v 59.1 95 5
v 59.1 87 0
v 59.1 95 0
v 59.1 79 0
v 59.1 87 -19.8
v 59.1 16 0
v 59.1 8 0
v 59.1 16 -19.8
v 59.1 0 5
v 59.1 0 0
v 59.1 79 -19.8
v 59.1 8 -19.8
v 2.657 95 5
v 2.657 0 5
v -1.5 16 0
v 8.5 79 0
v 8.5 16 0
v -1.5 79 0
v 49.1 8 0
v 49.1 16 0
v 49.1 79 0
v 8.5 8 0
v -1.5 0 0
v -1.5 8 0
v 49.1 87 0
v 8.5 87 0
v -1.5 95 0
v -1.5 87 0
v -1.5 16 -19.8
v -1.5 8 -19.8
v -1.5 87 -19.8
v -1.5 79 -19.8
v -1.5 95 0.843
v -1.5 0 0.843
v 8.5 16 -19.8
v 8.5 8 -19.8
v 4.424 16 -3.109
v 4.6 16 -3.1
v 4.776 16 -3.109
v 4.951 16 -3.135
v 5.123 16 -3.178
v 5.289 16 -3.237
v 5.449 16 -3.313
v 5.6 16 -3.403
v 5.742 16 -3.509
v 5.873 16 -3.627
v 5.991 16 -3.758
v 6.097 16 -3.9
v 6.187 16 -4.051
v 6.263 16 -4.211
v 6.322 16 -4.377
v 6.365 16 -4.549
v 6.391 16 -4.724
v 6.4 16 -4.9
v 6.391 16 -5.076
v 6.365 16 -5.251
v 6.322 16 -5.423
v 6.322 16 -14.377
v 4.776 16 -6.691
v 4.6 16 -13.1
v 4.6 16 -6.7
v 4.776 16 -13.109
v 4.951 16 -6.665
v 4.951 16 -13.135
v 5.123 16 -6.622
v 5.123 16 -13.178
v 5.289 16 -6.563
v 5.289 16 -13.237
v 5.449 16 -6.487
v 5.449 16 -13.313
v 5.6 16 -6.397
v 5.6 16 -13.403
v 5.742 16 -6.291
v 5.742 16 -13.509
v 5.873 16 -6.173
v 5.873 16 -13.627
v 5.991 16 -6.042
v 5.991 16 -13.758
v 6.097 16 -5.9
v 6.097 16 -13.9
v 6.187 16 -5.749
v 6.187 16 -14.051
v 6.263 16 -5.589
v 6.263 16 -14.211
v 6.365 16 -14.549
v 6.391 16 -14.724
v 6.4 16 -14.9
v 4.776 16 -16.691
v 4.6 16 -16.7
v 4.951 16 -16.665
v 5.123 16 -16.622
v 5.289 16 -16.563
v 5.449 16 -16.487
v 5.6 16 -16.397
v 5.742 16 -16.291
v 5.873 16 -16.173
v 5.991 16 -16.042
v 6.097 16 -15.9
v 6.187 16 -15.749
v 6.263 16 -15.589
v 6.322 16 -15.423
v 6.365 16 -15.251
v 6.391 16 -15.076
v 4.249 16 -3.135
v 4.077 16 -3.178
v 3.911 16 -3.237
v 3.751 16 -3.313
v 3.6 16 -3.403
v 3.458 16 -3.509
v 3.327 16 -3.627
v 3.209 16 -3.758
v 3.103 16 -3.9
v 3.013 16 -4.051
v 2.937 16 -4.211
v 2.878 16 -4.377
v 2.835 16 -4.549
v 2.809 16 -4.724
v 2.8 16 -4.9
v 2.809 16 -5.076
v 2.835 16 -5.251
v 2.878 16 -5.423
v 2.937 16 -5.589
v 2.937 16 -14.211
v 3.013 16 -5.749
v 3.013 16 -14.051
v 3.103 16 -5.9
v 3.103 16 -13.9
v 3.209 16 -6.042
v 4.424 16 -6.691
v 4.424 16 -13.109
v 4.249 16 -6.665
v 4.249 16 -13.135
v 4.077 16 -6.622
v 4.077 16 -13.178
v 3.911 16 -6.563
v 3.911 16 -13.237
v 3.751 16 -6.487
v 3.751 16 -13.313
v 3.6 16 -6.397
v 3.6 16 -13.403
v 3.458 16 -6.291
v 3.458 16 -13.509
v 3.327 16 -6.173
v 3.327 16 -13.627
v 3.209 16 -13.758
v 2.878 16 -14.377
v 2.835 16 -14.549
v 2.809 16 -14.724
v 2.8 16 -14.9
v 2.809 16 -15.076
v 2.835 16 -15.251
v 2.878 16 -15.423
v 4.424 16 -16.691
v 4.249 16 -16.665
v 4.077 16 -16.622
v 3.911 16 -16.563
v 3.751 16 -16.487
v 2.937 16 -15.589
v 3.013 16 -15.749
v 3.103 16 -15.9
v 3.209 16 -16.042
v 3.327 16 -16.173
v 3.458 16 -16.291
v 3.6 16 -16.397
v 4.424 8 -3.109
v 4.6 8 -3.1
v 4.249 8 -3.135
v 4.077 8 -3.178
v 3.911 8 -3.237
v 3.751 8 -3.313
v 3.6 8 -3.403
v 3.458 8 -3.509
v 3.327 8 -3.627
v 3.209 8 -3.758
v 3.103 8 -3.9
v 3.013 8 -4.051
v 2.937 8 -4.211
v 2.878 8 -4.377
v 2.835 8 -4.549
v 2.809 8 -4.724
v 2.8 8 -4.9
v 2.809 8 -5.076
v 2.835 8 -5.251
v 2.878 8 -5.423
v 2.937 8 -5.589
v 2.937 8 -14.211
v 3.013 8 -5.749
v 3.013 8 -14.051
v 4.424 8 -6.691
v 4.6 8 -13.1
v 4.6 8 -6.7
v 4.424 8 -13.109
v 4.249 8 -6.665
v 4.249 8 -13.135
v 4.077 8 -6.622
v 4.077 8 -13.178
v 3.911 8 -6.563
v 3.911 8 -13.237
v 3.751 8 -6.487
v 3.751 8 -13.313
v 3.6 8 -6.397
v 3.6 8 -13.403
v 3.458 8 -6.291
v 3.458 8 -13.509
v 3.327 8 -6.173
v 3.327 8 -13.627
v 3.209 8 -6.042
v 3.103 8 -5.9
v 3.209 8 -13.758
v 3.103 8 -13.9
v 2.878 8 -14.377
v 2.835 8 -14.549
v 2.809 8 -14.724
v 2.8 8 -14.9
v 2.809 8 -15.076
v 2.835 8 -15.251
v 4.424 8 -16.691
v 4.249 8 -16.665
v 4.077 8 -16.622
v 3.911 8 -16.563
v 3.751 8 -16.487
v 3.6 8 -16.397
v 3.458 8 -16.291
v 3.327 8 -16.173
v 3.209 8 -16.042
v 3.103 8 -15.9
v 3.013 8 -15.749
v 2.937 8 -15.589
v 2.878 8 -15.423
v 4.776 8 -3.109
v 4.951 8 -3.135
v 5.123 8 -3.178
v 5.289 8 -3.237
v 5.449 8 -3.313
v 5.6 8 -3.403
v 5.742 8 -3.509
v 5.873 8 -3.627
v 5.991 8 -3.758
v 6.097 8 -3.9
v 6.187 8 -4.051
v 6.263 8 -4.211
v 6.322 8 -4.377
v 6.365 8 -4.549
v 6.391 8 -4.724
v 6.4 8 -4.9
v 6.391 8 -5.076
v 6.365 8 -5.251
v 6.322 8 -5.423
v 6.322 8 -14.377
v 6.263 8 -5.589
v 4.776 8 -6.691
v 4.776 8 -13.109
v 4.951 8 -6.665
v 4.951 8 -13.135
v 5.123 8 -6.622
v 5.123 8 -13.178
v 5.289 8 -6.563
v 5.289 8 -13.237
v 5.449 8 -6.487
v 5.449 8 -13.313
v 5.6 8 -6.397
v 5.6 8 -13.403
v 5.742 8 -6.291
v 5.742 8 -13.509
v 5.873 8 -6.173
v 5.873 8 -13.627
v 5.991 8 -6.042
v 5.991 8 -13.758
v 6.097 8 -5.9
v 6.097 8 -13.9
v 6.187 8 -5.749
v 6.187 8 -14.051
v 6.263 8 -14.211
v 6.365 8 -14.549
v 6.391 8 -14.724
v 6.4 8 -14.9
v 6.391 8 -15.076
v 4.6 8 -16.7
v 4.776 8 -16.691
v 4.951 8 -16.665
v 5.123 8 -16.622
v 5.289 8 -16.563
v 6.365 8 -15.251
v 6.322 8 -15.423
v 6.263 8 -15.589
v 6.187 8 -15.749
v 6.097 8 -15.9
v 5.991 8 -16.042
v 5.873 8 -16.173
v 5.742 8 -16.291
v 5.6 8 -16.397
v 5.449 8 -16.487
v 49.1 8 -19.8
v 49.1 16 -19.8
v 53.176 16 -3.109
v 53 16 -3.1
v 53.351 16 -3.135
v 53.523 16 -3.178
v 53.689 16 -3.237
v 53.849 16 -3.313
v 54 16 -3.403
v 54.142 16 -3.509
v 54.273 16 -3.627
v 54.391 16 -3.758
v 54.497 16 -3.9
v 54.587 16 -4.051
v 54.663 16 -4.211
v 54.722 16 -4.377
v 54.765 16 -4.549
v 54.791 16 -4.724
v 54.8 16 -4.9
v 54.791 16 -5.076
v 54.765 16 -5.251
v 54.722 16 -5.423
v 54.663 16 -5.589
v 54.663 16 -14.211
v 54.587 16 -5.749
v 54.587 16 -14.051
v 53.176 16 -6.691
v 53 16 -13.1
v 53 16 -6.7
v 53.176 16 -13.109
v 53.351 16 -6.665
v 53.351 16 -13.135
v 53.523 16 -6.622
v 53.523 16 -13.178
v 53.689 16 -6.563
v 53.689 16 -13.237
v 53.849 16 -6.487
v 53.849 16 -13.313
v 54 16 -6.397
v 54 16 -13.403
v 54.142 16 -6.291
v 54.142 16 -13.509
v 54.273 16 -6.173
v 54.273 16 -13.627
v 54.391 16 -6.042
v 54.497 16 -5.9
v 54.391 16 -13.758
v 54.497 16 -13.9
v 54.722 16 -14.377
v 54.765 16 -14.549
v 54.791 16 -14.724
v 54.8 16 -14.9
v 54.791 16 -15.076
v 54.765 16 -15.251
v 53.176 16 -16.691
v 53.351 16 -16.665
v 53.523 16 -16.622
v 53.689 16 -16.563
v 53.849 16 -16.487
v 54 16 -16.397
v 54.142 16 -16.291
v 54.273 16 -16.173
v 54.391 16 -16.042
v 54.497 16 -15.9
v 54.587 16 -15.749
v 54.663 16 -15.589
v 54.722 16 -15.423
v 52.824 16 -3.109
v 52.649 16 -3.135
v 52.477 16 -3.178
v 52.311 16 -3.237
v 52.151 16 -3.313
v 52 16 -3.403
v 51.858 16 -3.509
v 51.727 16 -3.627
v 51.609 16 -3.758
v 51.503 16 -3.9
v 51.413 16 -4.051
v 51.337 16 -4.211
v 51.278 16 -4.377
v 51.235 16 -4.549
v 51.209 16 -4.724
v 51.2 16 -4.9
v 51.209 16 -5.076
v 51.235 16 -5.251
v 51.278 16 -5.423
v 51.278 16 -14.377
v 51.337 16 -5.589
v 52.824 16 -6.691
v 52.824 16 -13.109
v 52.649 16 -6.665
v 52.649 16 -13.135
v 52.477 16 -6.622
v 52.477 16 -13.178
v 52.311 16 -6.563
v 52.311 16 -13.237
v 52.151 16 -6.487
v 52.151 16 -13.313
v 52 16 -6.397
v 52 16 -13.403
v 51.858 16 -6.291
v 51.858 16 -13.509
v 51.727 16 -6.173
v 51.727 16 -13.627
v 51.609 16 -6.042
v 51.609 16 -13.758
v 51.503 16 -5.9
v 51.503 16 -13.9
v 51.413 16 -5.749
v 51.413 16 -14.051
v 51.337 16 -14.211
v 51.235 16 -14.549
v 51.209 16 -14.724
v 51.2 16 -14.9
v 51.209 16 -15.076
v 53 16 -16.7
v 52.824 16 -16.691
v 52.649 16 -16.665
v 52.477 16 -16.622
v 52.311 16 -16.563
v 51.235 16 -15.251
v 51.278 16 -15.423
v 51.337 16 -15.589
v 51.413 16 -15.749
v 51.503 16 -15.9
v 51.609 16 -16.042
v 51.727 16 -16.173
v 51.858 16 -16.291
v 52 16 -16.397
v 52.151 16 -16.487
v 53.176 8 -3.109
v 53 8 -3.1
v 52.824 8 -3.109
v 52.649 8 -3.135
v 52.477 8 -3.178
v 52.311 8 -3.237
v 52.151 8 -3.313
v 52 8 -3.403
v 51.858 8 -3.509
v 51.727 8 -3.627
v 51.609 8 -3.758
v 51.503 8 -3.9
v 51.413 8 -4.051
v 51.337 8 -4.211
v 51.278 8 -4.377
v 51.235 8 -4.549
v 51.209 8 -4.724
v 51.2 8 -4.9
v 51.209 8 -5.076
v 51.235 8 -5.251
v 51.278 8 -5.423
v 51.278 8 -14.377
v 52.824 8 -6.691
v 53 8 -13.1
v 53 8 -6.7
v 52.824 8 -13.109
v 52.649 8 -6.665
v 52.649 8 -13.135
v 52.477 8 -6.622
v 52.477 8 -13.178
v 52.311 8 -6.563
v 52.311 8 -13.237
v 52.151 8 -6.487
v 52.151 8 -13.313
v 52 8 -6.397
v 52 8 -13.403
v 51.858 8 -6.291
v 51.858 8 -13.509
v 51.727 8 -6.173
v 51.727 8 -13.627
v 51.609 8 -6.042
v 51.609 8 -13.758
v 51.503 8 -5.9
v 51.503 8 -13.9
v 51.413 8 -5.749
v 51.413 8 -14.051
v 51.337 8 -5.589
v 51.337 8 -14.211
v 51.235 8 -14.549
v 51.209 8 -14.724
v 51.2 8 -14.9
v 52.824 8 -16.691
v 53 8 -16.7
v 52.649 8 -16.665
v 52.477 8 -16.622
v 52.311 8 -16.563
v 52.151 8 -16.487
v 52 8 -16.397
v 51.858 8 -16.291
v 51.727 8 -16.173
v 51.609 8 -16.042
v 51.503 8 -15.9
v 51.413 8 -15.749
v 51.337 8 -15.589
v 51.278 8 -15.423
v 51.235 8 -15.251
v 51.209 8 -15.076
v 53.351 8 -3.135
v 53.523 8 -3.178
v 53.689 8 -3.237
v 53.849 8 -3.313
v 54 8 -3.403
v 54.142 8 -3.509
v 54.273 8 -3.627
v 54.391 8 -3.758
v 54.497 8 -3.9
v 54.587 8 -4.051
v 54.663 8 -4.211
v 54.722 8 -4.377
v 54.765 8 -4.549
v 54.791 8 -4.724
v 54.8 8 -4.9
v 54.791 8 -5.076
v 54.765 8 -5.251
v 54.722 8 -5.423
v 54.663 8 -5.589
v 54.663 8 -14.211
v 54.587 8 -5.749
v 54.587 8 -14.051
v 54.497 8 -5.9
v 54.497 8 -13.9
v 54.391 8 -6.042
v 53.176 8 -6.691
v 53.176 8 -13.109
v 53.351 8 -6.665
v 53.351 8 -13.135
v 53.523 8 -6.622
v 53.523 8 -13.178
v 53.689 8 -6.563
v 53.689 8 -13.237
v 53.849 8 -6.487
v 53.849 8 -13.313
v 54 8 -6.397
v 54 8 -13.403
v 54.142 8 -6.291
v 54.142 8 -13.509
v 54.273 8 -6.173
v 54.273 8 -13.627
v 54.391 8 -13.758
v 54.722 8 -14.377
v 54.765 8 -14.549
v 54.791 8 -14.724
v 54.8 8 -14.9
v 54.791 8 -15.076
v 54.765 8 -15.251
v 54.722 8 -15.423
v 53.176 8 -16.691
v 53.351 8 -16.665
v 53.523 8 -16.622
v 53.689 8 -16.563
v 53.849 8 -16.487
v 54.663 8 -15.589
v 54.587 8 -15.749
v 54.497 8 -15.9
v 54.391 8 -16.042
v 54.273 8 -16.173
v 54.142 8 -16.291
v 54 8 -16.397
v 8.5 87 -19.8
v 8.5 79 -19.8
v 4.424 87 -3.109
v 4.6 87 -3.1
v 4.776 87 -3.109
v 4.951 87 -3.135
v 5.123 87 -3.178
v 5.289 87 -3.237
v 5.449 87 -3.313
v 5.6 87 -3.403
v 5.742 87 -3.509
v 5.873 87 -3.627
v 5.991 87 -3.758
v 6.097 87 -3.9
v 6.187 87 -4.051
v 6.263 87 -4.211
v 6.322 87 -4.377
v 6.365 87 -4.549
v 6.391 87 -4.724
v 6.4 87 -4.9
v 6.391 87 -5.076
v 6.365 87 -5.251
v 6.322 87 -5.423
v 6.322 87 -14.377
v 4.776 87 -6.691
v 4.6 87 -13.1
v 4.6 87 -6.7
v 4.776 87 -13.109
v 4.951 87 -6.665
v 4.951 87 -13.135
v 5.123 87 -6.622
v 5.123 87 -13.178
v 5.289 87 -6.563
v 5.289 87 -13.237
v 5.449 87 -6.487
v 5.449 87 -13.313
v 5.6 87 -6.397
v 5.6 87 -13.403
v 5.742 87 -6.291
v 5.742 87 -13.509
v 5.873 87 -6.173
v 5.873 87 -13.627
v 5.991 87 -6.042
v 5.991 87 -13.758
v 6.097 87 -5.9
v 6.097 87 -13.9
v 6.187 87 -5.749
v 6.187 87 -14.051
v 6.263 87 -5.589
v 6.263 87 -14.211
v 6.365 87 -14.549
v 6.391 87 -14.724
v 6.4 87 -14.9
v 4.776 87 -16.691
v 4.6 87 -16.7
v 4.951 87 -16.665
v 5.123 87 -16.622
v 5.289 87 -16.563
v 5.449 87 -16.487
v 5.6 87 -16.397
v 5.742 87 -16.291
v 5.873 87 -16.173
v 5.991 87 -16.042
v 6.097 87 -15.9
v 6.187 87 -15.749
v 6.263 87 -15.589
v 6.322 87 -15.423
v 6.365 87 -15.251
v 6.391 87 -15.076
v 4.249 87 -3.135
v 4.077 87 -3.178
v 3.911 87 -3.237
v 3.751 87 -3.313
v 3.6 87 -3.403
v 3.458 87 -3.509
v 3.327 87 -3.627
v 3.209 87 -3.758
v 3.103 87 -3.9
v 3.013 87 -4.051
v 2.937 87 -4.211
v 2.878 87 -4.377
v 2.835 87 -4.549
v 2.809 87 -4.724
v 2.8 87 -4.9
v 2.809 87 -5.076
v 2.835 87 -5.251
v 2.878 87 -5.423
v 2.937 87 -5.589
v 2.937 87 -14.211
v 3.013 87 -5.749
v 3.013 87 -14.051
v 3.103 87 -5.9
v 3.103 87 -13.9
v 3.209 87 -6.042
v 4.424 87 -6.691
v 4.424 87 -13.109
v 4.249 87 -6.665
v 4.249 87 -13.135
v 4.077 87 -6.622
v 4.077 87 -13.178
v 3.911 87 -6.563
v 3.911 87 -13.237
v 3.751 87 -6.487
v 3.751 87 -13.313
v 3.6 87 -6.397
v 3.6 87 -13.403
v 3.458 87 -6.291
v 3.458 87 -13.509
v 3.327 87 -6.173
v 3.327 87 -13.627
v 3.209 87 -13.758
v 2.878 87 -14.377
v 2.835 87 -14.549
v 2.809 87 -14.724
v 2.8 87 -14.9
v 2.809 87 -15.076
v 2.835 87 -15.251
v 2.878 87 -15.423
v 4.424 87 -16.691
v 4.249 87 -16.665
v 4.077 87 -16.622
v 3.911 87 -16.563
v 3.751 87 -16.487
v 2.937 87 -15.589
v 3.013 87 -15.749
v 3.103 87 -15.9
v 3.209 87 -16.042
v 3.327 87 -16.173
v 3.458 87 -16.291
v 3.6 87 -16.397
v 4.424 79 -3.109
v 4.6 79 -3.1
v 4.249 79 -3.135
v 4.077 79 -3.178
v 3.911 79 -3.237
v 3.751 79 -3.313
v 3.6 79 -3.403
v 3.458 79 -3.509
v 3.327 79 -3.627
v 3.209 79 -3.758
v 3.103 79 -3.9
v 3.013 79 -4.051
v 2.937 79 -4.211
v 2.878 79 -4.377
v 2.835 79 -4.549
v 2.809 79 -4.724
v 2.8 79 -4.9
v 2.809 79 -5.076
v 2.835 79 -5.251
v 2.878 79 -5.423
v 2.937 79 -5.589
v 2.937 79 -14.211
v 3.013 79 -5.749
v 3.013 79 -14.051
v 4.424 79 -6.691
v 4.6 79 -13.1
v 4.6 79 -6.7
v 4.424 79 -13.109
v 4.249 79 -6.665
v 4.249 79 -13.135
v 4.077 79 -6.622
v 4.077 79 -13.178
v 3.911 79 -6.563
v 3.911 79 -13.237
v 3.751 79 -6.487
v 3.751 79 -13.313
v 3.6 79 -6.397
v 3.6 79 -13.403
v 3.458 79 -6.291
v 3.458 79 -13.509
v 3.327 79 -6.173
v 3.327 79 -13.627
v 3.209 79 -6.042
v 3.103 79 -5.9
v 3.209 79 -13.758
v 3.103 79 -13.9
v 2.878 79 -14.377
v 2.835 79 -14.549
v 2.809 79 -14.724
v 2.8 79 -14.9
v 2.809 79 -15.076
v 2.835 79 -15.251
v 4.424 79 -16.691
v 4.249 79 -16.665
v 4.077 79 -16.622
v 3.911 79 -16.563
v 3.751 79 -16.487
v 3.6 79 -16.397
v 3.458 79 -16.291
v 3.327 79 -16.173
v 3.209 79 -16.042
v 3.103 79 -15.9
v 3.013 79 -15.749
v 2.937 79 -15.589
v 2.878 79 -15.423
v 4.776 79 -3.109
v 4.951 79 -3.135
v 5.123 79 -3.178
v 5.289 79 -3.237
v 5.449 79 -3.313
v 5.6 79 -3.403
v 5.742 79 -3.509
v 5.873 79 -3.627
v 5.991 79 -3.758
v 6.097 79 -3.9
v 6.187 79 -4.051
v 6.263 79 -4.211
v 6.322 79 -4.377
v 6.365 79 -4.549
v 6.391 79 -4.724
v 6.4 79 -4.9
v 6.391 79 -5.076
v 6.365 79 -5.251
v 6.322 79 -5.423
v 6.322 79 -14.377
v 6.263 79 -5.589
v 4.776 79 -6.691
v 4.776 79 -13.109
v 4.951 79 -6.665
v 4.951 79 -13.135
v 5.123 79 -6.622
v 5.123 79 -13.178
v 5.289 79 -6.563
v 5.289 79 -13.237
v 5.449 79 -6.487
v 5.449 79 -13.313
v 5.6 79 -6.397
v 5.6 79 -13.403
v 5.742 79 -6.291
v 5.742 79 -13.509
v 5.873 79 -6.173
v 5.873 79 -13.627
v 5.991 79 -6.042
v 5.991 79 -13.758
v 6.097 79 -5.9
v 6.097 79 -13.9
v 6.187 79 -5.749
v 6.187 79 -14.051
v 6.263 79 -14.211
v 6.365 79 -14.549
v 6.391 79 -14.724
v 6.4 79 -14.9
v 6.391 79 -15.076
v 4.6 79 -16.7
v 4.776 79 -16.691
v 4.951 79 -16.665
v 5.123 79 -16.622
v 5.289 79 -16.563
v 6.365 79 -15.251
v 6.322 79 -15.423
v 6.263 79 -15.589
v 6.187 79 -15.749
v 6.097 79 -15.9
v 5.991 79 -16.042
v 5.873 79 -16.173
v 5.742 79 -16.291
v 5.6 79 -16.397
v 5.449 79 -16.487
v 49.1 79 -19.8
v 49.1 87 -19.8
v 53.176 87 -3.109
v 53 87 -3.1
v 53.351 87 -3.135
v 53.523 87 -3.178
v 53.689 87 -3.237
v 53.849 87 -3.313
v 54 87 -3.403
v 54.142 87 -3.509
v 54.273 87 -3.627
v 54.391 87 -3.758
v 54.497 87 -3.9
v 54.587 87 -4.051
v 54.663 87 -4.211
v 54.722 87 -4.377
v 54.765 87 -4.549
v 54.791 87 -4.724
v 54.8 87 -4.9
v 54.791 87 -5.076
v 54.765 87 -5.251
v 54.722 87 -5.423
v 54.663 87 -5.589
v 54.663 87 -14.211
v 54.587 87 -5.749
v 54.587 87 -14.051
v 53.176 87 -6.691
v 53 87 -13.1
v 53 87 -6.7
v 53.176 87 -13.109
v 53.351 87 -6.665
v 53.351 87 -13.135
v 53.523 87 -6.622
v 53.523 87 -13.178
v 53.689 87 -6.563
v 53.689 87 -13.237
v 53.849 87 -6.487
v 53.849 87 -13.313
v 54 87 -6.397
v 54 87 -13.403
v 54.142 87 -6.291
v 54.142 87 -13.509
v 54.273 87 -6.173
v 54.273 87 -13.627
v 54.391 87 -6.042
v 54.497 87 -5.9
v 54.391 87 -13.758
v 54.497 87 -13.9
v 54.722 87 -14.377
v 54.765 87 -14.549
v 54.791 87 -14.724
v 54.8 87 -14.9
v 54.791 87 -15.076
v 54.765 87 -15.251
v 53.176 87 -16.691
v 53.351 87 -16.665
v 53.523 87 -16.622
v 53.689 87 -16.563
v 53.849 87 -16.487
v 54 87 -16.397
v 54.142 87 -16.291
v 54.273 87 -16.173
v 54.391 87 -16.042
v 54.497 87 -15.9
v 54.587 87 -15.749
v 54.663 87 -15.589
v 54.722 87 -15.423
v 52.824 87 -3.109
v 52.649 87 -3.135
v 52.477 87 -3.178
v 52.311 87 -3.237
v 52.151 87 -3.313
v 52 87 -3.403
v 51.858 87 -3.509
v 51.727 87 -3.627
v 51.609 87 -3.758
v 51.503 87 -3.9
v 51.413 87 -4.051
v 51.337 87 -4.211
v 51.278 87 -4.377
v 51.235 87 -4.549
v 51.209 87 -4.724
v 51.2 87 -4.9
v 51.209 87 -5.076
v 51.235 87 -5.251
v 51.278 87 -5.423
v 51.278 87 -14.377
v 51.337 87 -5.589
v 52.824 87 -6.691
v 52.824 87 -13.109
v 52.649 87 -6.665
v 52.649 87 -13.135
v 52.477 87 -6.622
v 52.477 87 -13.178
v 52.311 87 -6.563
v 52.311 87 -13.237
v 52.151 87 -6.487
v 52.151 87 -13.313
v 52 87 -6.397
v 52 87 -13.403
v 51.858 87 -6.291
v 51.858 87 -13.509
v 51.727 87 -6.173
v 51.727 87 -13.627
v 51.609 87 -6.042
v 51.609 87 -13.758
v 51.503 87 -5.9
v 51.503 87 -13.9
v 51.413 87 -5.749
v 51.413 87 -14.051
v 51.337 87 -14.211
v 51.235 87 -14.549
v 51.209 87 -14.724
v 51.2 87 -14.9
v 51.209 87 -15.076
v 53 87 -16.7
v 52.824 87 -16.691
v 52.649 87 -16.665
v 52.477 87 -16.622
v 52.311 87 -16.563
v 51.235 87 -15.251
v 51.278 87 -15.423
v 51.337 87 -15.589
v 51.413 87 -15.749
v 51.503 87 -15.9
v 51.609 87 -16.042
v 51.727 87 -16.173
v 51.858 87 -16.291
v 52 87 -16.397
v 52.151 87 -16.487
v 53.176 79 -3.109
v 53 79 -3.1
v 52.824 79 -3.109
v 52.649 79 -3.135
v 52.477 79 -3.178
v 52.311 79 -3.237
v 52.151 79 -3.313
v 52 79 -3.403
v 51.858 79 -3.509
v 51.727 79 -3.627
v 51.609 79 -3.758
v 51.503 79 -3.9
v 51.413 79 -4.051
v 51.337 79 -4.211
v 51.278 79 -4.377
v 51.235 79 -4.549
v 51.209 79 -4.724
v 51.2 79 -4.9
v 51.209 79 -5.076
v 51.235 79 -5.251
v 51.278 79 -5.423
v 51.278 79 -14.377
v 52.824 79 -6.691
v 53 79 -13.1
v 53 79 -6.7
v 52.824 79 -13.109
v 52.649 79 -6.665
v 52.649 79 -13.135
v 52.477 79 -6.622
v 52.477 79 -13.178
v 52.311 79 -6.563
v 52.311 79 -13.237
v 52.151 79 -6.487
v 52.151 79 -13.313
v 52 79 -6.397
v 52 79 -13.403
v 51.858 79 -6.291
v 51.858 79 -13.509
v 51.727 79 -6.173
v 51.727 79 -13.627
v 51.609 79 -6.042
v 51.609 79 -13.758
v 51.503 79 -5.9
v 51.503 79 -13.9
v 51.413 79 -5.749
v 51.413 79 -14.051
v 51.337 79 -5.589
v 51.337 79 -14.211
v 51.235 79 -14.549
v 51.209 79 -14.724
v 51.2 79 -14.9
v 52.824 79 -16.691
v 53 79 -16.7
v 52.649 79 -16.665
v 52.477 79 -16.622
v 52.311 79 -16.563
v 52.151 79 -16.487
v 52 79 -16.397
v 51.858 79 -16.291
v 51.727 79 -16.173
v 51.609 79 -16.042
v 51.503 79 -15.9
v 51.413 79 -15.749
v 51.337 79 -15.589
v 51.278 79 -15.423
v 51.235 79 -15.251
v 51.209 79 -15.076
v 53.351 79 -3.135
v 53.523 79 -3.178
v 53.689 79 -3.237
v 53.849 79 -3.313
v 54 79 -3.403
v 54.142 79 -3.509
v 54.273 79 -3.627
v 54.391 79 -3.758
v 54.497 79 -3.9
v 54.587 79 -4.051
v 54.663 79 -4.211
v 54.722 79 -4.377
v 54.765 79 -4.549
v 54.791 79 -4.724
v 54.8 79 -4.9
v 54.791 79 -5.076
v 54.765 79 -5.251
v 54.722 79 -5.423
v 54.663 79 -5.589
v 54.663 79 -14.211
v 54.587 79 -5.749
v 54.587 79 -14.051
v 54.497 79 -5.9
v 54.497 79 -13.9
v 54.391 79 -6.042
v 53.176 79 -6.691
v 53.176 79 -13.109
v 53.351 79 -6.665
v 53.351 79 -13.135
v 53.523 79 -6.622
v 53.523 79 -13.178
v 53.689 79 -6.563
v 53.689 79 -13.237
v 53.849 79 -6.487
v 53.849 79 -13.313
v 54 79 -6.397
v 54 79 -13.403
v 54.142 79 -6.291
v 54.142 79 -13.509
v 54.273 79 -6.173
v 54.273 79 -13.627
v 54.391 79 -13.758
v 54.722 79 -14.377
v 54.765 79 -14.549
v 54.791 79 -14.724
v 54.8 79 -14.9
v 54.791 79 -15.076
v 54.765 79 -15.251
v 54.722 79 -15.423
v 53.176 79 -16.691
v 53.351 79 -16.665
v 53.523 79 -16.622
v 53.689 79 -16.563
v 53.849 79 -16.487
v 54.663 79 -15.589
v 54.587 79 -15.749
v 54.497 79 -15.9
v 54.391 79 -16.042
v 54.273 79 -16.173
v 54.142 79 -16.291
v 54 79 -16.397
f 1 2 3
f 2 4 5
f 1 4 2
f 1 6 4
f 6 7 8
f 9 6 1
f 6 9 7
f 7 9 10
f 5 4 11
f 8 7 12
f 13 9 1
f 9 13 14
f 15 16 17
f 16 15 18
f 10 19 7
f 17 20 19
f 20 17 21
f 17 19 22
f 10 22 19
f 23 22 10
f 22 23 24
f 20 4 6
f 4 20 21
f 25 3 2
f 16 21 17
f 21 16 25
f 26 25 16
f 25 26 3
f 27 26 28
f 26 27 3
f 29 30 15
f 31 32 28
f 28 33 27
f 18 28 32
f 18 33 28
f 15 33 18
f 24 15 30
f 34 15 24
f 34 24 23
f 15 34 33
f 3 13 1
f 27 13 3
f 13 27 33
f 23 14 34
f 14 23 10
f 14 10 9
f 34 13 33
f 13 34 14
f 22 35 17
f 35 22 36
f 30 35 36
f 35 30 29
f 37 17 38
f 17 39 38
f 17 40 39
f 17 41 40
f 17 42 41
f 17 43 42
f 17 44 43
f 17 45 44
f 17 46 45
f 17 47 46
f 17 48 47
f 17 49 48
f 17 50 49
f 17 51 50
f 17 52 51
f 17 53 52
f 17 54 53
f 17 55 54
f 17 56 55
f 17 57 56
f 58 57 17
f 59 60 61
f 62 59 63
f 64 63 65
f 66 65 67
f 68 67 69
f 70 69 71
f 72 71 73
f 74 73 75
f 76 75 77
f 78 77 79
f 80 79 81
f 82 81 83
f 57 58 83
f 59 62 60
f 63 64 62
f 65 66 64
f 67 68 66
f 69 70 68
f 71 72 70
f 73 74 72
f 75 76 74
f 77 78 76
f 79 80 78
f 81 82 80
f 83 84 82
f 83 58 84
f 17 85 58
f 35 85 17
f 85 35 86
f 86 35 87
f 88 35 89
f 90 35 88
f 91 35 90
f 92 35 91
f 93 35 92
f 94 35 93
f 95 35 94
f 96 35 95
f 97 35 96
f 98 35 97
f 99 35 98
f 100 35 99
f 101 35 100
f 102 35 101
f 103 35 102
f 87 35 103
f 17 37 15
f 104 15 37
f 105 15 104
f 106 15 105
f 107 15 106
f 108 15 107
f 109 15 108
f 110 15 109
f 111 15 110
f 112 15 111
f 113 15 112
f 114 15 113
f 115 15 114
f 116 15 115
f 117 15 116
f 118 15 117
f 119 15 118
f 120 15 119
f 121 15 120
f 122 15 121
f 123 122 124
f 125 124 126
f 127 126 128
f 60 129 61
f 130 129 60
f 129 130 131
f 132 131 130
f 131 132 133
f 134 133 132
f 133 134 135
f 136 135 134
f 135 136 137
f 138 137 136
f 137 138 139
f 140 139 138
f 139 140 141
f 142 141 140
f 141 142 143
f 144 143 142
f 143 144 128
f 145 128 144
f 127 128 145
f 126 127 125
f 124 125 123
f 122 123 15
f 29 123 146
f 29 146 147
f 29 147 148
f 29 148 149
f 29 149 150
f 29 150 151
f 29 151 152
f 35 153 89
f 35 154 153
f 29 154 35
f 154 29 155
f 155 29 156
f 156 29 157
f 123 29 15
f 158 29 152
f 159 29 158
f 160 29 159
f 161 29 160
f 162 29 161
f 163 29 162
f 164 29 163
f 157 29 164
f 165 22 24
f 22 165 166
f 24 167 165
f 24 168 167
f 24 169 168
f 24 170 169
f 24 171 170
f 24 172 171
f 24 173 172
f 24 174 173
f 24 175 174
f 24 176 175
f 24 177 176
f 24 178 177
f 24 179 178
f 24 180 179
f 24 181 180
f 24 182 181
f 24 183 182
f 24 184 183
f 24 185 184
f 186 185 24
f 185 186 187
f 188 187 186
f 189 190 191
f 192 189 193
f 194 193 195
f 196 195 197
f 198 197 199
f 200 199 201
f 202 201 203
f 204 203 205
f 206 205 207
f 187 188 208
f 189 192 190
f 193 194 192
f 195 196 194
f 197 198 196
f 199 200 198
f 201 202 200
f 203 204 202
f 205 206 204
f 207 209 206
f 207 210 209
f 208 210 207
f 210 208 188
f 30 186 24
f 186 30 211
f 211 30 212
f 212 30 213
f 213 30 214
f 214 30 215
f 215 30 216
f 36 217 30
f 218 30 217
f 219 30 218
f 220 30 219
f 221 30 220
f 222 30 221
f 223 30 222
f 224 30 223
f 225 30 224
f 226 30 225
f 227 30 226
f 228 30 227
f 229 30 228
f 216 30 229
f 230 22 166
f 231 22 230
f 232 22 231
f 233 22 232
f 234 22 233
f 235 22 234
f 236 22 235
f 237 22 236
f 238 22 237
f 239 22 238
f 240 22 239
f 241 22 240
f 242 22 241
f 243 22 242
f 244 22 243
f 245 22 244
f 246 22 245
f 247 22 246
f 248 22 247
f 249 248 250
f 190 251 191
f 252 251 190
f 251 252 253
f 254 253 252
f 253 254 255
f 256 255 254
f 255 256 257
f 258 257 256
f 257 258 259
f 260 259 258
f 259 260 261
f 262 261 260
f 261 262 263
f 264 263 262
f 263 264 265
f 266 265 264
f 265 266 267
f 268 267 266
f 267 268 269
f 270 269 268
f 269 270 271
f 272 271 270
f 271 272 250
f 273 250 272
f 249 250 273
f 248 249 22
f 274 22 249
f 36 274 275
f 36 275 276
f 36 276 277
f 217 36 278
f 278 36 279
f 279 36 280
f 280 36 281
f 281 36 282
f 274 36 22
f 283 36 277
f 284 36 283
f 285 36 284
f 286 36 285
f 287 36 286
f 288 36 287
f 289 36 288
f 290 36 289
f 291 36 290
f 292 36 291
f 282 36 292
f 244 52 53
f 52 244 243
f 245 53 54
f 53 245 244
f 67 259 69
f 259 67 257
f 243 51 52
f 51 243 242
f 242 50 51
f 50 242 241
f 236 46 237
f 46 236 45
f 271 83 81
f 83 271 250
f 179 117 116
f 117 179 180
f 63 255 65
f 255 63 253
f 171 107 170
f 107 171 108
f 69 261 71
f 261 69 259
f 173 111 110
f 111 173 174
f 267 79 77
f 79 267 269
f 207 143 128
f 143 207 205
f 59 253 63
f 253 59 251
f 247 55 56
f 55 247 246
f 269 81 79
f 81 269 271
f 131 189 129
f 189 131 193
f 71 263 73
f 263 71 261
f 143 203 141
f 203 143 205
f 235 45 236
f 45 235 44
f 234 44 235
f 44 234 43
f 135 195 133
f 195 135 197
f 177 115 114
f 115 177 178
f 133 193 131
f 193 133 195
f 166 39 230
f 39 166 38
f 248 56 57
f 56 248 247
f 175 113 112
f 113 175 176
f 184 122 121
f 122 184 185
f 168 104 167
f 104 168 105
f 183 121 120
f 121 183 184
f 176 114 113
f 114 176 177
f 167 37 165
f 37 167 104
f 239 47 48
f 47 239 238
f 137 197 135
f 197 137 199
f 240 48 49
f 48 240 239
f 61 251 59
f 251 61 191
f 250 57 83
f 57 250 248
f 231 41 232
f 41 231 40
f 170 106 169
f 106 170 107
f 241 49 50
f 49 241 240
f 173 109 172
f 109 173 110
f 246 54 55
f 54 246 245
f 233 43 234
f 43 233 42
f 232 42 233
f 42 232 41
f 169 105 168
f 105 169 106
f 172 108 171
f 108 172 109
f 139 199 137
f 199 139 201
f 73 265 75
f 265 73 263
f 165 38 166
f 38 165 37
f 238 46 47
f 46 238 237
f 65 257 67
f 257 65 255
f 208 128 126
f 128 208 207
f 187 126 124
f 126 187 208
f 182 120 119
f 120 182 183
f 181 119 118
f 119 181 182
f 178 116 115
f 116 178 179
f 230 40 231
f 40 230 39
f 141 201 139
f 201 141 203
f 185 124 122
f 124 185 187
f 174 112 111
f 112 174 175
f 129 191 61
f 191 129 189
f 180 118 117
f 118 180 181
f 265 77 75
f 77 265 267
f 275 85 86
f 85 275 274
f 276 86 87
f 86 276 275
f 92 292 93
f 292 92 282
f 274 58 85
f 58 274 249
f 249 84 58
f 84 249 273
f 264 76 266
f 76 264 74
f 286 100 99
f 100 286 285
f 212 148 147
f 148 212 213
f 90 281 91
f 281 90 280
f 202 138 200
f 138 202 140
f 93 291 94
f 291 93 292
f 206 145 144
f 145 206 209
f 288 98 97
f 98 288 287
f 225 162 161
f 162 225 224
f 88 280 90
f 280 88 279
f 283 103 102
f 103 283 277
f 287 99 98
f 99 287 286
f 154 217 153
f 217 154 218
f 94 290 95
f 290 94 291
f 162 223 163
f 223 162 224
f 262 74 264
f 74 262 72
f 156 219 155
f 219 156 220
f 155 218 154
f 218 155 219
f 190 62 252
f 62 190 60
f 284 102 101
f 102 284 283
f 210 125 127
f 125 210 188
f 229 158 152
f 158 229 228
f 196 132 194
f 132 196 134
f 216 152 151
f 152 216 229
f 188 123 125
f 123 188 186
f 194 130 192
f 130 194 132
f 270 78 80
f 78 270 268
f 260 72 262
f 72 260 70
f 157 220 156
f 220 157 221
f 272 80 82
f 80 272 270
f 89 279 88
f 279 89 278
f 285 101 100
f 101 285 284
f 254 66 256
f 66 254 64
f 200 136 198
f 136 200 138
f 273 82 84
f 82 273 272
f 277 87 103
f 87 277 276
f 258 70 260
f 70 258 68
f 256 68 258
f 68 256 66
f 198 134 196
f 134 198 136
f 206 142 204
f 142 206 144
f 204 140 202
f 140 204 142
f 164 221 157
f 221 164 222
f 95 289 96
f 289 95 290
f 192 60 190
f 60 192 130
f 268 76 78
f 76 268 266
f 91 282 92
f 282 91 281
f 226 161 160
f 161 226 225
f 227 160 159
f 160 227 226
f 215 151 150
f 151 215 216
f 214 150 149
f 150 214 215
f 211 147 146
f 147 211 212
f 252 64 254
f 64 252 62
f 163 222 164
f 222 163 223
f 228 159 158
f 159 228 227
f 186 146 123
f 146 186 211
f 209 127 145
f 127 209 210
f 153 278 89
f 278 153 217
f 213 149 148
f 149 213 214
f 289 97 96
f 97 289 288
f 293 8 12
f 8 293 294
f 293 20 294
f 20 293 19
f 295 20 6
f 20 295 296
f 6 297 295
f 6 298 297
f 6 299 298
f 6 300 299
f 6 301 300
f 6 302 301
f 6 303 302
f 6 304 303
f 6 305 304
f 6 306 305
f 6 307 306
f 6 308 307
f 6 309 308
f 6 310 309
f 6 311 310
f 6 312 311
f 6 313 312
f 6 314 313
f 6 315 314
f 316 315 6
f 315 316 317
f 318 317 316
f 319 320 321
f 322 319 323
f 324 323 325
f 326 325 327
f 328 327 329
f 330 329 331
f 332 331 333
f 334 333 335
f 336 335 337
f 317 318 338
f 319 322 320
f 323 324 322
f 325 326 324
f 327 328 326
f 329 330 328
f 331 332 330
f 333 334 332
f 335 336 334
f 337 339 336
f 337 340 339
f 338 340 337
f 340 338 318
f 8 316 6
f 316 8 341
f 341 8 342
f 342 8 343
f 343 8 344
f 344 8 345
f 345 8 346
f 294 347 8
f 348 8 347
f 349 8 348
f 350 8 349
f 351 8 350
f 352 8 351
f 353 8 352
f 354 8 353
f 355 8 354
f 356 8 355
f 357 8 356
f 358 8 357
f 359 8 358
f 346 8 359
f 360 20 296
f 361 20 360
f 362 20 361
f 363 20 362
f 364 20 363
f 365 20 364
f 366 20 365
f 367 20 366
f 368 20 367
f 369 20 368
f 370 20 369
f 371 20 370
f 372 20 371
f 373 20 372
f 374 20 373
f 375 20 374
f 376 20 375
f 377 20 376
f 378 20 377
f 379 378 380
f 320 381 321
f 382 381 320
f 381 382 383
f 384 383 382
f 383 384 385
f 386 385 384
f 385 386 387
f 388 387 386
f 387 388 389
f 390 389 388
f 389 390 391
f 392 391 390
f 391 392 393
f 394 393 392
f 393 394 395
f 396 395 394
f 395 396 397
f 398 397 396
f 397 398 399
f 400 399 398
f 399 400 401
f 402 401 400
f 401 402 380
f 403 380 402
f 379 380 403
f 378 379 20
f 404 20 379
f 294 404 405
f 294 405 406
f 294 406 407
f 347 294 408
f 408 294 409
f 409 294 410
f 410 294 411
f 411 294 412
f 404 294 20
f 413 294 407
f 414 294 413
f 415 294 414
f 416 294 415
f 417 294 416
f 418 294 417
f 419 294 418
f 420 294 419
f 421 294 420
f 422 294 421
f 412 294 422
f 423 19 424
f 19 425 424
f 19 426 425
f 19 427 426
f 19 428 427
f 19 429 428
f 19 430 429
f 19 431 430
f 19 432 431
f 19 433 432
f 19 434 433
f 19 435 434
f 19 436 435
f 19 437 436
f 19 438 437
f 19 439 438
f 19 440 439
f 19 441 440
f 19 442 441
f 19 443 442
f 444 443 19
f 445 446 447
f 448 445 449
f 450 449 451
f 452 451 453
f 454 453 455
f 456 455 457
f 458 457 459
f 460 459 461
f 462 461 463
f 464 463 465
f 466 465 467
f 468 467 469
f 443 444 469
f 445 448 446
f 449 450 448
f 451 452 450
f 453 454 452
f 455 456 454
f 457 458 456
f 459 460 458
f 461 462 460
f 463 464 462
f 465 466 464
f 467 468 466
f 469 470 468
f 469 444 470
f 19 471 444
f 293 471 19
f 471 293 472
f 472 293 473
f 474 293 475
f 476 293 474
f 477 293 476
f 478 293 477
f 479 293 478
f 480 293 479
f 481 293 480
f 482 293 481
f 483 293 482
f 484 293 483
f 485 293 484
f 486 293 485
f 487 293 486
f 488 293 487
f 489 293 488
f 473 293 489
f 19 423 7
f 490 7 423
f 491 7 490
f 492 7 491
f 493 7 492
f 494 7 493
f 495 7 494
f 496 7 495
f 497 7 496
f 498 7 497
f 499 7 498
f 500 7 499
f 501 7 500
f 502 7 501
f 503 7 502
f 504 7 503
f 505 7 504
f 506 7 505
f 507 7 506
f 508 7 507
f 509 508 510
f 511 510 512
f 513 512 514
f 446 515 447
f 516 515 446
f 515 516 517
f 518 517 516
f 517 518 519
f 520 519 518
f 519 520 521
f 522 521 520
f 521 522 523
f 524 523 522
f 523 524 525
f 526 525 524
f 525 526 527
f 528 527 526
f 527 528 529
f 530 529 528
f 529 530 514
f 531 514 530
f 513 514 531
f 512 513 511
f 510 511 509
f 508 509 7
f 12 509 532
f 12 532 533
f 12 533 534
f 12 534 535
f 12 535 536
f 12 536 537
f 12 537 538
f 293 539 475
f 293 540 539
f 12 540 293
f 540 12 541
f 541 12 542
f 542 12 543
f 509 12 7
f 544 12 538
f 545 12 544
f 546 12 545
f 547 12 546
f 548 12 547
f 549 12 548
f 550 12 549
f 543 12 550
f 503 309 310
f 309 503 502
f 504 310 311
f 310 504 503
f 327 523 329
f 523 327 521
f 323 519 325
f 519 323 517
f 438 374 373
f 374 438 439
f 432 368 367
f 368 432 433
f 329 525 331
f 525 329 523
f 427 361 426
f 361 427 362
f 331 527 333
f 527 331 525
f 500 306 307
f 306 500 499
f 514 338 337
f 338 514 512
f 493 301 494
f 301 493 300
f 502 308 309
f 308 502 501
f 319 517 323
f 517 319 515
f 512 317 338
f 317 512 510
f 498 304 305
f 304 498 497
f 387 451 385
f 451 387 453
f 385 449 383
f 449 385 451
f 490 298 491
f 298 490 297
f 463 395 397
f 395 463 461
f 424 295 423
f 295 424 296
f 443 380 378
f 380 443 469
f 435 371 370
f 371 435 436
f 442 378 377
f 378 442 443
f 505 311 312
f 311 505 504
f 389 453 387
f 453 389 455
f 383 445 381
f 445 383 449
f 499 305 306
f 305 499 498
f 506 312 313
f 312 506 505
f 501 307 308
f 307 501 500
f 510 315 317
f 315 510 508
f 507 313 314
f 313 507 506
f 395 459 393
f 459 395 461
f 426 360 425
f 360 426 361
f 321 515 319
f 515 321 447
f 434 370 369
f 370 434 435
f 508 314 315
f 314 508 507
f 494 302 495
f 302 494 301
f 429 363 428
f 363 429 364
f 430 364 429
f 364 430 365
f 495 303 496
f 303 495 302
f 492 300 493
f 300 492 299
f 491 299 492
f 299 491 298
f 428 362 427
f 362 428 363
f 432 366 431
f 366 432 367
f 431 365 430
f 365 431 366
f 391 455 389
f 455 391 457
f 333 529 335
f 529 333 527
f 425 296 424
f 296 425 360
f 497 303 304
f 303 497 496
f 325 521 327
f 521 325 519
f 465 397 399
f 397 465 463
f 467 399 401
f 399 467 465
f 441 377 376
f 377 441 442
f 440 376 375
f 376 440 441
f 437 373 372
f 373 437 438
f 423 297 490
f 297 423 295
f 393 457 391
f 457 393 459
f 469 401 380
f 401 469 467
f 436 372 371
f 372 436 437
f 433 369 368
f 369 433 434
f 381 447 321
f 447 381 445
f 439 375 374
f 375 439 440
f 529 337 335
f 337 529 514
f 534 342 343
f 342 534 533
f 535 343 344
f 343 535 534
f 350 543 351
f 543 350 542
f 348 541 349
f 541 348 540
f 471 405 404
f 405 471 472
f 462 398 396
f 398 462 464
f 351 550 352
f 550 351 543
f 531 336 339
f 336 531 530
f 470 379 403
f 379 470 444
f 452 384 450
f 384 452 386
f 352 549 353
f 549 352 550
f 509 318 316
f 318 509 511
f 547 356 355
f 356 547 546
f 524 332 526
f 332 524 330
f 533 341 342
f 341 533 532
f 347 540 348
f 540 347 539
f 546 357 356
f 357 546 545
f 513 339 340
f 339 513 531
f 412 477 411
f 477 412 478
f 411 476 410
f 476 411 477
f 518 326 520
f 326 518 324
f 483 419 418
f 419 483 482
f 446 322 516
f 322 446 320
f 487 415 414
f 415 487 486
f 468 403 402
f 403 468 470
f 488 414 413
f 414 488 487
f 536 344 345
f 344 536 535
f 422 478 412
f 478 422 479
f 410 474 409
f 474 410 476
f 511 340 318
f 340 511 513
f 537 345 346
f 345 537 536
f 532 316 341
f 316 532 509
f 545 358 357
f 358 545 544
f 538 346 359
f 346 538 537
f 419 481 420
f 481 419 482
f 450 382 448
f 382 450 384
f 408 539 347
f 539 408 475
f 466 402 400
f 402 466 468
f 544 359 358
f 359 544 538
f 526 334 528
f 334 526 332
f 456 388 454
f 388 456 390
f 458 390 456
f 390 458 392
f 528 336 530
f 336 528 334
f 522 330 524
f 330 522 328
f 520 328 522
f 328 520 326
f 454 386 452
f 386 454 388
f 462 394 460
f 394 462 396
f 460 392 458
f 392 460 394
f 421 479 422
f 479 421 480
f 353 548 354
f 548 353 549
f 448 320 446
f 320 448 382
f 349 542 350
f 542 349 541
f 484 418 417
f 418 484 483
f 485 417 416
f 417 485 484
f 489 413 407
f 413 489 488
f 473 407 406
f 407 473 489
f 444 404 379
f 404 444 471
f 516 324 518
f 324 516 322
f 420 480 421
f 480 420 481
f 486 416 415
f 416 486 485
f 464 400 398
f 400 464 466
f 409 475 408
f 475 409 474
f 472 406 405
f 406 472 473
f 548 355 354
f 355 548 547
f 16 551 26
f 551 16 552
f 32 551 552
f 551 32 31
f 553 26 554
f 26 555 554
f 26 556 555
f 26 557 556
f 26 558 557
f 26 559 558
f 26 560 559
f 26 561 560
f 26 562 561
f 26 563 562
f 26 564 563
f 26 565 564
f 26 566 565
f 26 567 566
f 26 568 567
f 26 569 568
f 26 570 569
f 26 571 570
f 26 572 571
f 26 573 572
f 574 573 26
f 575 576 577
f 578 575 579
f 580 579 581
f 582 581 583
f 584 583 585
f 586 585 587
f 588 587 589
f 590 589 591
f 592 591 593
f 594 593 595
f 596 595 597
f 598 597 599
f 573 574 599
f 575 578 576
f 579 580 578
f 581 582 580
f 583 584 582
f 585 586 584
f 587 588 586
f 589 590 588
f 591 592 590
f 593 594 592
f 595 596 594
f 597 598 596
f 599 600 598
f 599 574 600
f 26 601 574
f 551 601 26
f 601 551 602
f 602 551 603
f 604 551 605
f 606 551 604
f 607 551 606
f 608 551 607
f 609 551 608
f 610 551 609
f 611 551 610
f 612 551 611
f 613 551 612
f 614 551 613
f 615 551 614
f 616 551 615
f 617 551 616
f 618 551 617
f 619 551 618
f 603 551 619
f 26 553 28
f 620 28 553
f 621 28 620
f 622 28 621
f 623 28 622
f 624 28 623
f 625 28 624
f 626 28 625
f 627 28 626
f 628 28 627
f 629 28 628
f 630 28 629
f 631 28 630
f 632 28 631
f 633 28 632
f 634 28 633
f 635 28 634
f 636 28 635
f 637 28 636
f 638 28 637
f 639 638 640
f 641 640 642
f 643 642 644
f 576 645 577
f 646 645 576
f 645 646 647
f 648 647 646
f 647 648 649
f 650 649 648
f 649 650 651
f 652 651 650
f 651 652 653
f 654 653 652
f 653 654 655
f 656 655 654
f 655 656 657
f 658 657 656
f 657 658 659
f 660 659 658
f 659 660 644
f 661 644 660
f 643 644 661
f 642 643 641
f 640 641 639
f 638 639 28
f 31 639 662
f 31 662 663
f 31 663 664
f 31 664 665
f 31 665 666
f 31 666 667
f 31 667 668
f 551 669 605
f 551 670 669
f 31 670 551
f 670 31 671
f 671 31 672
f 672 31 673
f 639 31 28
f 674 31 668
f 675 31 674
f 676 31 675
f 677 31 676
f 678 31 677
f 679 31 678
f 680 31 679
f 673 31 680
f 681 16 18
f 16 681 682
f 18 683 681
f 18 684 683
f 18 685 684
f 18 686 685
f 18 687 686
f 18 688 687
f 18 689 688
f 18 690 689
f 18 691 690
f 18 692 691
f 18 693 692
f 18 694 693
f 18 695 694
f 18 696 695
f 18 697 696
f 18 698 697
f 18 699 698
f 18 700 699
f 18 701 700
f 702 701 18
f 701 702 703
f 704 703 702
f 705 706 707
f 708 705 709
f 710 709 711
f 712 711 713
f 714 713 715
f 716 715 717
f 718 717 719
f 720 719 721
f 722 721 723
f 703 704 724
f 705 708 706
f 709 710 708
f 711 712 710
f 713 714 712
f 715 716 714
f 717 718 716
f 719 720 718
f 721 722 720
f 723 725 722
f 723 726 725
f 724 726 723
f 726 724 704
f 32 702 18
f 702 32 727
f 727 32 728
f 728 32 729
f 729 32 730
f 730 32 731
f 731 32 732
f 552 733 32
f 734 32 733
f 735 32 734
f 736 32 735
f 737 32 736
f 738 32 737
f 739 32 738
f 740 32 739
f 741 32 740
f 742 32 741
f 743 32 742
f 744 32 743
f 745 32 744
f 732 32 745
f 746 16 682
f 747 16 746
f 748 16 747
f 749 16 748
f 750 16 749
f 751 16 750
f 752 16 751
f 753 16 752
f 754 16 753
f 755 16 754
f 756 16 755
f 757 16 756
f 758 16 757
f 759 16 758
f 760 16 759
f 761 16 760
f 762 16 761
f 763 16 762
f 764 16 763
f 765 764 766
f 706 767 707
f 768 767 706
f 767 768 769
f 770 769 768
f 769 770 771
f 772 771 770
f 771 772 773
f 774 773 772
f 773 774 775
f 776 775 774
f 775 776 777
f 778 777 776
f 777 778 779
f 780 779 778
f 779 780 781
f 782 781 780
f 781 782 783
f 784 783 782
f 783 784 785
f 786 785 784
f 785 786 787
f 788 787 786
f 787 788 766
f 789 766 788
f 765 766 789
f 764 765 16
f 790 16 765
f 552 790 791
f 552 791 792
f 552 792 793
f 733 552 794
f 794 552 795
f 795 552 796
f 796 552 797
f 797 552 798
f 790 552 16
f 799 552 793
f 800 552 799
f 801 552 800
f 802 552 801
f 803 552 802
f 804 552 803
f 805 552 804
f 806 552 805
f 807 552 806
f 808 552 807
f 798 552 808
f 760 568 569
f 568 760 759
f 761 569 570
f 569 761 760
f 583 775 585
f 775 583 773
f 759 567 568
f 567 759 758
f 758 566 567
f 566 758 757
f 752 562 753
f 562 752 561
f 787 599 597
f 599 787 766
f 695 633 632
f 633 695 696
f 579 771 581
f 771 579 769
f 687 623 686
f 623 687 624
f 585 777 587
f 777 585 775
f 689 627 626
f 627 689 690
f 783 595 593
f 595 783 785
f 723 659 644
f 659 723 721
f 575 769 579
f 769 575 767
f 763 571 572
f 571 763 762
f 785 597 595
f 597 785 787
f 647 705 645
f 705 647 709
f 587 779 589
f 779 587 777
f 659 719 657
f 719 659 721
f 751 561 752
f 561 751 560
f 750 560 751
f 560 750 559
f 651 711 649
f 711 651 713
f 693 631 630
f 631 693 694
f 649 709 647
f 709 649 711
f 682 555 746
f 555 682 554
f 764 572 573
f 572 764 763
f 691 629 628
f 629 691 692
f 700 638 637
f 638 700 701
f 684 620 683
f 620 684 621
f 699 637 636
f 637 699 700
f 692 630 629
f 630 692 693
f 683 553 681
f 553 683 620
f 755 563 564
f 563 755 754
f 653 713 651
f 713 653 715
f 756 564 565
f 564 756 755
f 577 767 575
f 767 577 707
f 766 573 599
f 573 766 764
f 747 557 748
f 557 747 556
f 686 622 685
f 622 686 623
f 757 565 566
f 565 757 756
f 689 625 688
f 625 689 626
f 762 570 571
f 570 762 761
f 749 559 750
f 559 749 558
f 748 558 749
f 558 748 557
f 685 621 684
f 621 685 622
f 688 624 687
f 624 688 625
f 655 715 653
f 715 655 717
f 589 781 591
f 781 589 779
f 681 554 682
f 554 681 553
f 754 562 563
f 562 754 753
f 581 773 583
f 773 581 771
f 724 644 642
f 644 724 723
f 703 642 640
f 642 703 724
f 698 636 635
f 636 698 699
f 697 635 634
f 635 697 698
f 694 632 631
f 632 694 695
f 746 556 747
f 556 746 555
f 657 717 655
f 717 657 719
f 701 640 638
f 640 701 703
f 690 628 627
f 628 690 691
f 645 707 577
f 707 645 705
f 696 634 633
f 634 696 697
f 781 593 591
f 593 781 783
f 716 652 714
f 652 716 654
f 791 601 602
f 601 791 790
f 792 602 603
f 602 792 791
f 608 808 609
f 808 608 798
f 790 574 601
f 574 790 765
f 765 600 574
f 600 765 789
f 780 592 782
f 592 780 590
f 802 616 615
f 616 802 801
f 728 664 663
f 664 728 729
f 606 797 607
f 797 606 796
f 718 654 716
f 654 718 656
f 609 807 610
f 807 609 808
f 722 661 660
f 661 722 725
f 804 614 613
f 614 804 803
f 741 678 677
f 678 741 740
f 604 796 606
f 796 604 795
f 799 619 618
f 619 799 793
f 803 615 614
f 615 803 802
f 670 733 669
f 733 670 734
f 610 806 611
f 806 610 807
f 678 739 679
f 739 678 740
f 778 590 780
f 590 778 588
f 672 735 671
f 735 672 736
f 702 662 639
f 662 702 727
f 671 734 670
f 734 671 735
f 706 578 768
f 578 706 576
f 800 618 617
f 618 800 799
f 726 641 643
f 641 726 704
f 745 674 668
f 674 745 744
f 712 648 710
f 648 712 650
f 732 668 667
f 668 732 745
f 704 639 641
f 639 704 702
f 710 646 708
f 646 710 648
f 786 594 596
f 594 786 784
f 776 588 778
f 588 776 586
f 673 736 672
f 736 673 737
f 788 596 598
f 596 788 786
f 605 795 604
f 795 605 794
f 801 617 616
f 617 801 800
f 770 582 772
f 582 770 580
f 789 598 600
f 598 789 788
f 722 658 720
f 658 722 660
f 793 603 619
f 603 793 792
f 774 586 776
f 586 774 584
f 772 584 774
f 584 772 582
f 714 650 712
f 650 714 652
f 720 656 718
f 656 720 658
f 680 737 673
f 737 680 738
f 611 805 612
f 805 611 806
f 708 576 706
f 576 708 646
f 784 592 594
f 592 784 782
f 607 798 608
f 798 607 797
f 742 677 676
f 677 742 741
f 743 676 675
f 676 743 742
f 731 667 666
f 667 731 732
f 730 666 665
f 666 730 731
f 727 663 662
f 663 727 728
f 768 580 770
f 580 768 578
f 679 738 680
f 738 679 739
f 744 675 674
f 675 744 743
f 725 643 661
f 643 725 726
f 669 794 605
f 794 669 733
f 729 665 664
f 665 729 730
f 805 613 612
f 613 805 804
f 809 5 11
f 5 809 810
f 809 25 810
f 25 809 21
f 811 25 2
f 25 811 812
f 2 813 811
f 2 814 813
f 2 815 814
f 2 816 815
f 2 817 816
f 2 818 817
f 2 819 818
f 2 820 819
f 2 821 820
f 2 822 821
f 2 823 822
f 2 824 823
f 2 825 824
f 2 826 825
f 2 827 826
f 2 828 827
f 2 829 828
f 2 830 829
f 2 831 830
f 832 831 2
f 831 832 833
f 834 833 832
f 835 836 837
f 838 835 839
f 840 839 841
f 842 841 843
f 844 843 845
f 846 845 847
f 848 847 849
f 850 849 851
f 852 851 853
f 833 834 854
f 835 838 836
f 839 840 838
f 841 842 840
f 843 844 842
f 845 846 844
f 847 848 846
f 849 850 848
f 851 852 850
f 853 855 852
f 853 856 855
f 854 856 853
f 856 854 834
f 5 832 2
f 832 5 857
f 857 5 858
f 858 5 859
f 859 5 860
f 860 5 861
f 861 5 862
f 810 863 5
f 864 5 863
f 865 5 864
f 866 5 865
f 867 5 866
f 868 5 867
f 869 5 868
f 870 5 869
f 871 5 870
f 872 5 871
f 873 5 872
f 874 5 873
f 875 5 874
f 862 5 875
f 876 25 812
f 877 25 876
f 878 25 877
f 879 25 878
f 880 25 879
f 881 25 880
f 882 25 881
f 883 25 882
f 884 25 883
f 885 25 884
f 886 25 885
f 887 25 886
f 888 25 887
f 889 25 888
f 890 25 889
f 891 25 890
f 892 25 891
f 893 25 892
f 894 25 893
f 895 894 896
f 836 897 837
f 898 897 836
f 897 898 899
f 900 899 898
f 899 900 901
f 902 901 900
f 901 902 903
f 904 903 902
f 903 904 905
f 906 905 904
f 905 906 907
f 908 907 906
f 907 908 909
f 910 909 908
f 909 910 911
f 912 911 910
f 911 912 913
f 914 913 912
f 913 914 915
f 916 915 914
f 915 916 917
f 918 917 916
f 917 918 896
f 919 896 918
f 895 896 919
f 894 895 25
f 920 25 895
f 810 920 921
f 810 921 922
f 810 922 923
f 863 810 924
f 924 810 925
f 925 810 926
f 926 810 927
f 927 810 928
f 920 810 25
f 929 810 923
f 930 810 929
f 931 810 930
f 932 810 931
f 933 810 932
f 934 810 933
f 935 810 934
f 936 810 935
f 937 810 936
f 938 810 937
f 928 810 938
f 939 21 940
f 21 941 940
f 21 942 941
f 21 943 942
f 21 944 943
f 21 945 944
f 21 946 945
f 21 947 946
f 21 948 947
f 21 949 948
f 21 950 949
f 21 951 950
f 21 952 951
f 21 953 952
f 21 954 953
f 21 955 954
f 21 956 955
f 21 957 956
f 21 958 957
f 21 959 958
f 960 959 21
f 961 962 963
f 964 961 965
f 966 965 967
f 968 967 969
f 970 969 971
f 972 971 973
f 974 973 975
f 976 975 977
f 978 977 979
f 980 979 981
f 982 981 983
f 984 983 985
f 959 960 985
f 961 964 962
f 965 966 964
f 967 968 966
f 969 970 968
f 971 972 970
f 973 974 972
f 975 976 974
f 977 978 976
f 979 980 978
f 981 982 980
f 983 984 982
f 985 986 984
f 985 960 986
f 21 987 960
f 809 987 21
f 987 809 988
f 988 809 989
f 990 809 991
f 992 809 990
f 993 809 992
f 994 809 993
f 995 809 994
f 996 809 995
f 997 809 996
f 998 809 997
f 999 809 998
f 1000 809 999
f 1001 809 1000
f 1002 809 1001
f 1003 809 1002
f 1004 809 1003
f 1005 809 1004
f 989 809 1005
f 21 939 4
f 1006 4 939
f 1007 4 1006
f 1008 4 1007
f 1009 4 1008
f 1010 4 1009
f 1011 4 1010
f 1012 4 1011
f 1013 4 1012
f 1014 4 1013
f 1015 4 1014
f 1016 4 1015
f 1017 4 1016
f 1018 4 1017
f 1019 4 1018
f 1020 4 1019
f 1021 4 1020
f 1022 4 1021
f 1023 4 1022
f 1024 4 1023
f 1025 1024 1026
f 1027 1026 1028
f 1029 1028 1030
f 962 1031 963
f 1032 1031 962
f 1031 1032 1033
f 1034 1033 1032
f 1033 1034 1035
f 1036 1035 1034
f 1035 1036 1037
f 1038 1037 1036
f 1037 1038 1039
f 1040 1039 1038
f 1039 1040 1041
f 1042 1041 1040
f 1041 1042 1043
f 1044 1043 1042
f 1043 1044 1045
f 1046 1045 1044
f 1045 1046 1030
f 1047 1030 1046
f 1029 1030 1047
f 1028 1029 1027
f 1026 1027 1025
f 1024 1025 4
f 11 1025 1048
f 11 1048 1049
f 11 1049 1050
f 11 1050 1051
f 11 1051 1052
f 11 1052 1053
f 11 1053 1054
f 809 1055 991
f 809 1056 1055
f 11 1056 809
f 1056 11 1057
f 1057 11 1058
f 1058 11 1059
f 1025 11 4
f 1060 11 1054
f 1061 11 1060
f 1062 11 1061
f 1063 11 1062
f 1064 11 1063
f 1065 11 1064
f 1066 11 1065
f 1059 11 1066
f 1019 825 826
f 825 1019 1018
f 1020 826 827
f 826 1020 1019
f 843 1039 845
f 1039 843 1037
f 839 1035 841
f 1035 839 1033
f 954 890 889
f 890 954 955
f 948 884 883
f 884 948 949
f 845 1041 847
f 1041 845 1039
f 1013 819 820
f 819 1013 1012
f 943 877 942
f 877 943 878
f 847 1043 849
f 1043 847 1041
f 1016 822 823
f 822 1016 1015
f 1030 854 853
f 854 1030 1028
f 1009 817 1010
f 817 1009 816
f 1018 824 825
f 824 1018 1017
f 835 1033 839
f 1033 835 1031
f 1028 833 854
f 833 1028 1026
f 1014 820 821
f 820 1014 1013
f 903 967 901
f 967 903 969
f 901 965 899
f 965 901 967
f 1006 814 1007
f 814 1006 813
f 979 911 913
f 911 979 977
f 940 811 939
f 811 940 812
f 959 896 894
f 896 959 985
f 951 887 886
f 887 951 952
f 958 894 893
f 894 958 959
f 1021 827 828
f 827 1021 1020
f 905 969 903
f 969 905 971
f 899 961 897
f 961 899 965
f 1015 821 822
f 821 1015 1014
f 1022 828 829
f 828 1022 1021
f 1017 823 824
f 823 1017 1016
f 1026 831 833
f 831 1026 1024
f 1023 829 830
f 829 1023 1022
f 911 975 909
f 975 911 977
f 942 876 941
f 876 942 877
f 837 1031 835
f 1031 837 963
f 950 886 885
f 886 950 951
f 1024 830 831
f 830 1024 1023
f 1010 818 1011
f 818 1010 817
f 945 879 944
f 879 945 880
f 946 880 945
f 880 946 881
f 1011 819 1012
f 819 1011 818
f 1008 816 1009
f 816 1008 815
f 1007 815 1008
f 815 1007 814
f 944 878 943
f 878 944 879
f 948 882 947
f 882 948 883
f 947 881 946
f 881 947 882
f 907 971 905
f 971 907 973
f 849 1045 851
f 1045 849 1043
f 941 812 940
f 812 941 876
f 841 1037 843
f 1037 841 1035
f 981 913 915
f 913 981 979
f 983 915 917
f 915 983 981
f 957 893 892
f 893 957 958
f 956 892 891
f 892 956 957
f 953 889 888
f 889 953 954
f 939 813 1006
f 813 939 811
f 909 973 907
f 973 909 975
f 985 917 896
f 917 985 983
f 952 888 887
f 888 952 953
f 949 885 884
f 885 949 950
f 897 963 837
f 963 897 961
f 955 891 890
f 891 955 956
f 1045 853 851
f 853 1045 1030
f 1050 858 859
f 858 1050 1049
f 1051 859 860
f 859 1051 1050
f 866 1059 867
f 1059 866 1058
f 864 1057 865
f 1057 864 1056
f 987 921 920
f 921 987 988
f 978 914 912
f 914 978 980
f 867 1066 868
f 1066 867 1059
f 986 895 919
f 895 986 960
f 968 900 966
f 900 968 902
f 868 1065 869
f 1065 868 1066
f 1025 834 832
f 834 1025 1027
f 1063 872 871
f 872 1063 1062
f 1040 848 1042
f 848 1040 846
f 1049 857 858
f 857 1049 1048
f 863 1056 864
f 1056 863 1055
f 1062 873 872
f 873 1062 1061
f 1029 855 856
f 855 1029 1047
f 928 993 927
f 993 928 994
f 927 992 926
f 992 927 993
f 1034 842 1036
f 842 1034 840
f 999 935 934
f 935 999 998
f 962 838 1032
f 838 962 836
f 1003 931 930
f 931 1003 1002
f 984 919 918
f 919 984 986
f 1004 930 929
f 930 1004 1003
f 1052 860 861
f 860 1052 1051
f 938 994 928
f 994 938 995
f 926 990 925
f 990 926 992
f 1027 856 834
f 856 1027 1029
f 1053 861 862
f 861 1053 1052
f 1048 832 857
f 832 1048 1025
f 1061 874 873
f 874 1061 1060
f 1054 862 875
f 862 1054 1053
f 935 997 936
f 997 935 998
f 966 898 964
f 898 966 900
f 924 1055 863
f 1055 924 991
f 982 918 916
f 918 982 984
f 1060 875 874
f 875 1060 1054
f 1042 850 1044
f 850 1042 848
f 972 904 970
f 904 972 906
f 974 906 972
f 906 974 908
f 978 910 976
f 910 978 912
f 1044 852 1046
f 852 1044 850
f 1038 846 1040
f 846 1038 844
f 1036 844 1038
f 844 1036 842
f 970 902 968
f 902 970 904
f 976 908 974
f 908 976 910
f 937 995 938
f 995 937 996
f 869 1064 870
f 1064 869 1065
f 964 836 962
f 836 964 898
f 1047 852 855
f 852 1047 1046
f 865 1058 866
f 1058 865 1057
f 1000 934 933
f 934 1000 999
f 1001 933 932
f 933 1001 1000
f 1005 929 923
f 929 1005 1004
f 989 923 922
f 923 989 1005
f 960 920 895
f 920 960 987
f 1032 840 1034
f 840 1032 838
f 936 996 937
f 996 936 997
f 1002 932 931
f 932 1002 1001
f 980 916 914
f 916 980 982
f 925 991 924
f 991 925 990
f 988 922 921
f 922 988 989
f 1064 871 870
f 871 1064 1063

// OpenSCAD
//servo mounts have been moved further from each other by an additional 0.5 mm each

$fn=64;

//main body
difference(){
translate([-1.5,0,0])      cube([60.6,95,5]);  
    
translate([152,15,-2.5])    cube([7,63,10]);
    
translate([-5,-1,3])    rotate([0,45,0])     cube([4,97,8]); 
}


//front shoulder servo mounts
difference(){
translate([-1.5,8,-19.8])   cube([10,8,19.8]);
    
translate([4.6,25,-4.9])  rotate([90,0,0]) cylinder(20,1.8,1.8);
    
translate([4.6,25,-14.9]) rotate([90,0,0]) cylinder(20,1.8,1.8);
}

difference(){
translate([49.1,8,-19.8])   cube([10,8,19.8]);
    
translate([53,25,-4.9])  rotate([90,0,0]) cylinder(20,1.8,1.8);
    
translate([53,25,-14.9]) rotate([90,0,0]) cylinder(20,1.8,1.8);
}

//rear shoulder servo mount
difference(){
translate([-1.5,79,-19.8])   cube([10,8,19.8]);
    
translate([4.6,89,-4.9])  rotate([90,0,0]) cylinder(20,1.8,1.8);
    
translate([4.6,89,-14.9]) rotate([90,0,0]) cylinder(20,1.8,1.8);
}

difference(){
translate([49.1,79,-19.8])   cube([10,8,19.8]);
    
translate([53,90,-4.9])  rotate([90,0,0]) cylinder(20,1.8,1.8);
    
translate([53,90,-14.9]) rotate([90,0,0]) cylinder(20,1.8,1.8);
}
